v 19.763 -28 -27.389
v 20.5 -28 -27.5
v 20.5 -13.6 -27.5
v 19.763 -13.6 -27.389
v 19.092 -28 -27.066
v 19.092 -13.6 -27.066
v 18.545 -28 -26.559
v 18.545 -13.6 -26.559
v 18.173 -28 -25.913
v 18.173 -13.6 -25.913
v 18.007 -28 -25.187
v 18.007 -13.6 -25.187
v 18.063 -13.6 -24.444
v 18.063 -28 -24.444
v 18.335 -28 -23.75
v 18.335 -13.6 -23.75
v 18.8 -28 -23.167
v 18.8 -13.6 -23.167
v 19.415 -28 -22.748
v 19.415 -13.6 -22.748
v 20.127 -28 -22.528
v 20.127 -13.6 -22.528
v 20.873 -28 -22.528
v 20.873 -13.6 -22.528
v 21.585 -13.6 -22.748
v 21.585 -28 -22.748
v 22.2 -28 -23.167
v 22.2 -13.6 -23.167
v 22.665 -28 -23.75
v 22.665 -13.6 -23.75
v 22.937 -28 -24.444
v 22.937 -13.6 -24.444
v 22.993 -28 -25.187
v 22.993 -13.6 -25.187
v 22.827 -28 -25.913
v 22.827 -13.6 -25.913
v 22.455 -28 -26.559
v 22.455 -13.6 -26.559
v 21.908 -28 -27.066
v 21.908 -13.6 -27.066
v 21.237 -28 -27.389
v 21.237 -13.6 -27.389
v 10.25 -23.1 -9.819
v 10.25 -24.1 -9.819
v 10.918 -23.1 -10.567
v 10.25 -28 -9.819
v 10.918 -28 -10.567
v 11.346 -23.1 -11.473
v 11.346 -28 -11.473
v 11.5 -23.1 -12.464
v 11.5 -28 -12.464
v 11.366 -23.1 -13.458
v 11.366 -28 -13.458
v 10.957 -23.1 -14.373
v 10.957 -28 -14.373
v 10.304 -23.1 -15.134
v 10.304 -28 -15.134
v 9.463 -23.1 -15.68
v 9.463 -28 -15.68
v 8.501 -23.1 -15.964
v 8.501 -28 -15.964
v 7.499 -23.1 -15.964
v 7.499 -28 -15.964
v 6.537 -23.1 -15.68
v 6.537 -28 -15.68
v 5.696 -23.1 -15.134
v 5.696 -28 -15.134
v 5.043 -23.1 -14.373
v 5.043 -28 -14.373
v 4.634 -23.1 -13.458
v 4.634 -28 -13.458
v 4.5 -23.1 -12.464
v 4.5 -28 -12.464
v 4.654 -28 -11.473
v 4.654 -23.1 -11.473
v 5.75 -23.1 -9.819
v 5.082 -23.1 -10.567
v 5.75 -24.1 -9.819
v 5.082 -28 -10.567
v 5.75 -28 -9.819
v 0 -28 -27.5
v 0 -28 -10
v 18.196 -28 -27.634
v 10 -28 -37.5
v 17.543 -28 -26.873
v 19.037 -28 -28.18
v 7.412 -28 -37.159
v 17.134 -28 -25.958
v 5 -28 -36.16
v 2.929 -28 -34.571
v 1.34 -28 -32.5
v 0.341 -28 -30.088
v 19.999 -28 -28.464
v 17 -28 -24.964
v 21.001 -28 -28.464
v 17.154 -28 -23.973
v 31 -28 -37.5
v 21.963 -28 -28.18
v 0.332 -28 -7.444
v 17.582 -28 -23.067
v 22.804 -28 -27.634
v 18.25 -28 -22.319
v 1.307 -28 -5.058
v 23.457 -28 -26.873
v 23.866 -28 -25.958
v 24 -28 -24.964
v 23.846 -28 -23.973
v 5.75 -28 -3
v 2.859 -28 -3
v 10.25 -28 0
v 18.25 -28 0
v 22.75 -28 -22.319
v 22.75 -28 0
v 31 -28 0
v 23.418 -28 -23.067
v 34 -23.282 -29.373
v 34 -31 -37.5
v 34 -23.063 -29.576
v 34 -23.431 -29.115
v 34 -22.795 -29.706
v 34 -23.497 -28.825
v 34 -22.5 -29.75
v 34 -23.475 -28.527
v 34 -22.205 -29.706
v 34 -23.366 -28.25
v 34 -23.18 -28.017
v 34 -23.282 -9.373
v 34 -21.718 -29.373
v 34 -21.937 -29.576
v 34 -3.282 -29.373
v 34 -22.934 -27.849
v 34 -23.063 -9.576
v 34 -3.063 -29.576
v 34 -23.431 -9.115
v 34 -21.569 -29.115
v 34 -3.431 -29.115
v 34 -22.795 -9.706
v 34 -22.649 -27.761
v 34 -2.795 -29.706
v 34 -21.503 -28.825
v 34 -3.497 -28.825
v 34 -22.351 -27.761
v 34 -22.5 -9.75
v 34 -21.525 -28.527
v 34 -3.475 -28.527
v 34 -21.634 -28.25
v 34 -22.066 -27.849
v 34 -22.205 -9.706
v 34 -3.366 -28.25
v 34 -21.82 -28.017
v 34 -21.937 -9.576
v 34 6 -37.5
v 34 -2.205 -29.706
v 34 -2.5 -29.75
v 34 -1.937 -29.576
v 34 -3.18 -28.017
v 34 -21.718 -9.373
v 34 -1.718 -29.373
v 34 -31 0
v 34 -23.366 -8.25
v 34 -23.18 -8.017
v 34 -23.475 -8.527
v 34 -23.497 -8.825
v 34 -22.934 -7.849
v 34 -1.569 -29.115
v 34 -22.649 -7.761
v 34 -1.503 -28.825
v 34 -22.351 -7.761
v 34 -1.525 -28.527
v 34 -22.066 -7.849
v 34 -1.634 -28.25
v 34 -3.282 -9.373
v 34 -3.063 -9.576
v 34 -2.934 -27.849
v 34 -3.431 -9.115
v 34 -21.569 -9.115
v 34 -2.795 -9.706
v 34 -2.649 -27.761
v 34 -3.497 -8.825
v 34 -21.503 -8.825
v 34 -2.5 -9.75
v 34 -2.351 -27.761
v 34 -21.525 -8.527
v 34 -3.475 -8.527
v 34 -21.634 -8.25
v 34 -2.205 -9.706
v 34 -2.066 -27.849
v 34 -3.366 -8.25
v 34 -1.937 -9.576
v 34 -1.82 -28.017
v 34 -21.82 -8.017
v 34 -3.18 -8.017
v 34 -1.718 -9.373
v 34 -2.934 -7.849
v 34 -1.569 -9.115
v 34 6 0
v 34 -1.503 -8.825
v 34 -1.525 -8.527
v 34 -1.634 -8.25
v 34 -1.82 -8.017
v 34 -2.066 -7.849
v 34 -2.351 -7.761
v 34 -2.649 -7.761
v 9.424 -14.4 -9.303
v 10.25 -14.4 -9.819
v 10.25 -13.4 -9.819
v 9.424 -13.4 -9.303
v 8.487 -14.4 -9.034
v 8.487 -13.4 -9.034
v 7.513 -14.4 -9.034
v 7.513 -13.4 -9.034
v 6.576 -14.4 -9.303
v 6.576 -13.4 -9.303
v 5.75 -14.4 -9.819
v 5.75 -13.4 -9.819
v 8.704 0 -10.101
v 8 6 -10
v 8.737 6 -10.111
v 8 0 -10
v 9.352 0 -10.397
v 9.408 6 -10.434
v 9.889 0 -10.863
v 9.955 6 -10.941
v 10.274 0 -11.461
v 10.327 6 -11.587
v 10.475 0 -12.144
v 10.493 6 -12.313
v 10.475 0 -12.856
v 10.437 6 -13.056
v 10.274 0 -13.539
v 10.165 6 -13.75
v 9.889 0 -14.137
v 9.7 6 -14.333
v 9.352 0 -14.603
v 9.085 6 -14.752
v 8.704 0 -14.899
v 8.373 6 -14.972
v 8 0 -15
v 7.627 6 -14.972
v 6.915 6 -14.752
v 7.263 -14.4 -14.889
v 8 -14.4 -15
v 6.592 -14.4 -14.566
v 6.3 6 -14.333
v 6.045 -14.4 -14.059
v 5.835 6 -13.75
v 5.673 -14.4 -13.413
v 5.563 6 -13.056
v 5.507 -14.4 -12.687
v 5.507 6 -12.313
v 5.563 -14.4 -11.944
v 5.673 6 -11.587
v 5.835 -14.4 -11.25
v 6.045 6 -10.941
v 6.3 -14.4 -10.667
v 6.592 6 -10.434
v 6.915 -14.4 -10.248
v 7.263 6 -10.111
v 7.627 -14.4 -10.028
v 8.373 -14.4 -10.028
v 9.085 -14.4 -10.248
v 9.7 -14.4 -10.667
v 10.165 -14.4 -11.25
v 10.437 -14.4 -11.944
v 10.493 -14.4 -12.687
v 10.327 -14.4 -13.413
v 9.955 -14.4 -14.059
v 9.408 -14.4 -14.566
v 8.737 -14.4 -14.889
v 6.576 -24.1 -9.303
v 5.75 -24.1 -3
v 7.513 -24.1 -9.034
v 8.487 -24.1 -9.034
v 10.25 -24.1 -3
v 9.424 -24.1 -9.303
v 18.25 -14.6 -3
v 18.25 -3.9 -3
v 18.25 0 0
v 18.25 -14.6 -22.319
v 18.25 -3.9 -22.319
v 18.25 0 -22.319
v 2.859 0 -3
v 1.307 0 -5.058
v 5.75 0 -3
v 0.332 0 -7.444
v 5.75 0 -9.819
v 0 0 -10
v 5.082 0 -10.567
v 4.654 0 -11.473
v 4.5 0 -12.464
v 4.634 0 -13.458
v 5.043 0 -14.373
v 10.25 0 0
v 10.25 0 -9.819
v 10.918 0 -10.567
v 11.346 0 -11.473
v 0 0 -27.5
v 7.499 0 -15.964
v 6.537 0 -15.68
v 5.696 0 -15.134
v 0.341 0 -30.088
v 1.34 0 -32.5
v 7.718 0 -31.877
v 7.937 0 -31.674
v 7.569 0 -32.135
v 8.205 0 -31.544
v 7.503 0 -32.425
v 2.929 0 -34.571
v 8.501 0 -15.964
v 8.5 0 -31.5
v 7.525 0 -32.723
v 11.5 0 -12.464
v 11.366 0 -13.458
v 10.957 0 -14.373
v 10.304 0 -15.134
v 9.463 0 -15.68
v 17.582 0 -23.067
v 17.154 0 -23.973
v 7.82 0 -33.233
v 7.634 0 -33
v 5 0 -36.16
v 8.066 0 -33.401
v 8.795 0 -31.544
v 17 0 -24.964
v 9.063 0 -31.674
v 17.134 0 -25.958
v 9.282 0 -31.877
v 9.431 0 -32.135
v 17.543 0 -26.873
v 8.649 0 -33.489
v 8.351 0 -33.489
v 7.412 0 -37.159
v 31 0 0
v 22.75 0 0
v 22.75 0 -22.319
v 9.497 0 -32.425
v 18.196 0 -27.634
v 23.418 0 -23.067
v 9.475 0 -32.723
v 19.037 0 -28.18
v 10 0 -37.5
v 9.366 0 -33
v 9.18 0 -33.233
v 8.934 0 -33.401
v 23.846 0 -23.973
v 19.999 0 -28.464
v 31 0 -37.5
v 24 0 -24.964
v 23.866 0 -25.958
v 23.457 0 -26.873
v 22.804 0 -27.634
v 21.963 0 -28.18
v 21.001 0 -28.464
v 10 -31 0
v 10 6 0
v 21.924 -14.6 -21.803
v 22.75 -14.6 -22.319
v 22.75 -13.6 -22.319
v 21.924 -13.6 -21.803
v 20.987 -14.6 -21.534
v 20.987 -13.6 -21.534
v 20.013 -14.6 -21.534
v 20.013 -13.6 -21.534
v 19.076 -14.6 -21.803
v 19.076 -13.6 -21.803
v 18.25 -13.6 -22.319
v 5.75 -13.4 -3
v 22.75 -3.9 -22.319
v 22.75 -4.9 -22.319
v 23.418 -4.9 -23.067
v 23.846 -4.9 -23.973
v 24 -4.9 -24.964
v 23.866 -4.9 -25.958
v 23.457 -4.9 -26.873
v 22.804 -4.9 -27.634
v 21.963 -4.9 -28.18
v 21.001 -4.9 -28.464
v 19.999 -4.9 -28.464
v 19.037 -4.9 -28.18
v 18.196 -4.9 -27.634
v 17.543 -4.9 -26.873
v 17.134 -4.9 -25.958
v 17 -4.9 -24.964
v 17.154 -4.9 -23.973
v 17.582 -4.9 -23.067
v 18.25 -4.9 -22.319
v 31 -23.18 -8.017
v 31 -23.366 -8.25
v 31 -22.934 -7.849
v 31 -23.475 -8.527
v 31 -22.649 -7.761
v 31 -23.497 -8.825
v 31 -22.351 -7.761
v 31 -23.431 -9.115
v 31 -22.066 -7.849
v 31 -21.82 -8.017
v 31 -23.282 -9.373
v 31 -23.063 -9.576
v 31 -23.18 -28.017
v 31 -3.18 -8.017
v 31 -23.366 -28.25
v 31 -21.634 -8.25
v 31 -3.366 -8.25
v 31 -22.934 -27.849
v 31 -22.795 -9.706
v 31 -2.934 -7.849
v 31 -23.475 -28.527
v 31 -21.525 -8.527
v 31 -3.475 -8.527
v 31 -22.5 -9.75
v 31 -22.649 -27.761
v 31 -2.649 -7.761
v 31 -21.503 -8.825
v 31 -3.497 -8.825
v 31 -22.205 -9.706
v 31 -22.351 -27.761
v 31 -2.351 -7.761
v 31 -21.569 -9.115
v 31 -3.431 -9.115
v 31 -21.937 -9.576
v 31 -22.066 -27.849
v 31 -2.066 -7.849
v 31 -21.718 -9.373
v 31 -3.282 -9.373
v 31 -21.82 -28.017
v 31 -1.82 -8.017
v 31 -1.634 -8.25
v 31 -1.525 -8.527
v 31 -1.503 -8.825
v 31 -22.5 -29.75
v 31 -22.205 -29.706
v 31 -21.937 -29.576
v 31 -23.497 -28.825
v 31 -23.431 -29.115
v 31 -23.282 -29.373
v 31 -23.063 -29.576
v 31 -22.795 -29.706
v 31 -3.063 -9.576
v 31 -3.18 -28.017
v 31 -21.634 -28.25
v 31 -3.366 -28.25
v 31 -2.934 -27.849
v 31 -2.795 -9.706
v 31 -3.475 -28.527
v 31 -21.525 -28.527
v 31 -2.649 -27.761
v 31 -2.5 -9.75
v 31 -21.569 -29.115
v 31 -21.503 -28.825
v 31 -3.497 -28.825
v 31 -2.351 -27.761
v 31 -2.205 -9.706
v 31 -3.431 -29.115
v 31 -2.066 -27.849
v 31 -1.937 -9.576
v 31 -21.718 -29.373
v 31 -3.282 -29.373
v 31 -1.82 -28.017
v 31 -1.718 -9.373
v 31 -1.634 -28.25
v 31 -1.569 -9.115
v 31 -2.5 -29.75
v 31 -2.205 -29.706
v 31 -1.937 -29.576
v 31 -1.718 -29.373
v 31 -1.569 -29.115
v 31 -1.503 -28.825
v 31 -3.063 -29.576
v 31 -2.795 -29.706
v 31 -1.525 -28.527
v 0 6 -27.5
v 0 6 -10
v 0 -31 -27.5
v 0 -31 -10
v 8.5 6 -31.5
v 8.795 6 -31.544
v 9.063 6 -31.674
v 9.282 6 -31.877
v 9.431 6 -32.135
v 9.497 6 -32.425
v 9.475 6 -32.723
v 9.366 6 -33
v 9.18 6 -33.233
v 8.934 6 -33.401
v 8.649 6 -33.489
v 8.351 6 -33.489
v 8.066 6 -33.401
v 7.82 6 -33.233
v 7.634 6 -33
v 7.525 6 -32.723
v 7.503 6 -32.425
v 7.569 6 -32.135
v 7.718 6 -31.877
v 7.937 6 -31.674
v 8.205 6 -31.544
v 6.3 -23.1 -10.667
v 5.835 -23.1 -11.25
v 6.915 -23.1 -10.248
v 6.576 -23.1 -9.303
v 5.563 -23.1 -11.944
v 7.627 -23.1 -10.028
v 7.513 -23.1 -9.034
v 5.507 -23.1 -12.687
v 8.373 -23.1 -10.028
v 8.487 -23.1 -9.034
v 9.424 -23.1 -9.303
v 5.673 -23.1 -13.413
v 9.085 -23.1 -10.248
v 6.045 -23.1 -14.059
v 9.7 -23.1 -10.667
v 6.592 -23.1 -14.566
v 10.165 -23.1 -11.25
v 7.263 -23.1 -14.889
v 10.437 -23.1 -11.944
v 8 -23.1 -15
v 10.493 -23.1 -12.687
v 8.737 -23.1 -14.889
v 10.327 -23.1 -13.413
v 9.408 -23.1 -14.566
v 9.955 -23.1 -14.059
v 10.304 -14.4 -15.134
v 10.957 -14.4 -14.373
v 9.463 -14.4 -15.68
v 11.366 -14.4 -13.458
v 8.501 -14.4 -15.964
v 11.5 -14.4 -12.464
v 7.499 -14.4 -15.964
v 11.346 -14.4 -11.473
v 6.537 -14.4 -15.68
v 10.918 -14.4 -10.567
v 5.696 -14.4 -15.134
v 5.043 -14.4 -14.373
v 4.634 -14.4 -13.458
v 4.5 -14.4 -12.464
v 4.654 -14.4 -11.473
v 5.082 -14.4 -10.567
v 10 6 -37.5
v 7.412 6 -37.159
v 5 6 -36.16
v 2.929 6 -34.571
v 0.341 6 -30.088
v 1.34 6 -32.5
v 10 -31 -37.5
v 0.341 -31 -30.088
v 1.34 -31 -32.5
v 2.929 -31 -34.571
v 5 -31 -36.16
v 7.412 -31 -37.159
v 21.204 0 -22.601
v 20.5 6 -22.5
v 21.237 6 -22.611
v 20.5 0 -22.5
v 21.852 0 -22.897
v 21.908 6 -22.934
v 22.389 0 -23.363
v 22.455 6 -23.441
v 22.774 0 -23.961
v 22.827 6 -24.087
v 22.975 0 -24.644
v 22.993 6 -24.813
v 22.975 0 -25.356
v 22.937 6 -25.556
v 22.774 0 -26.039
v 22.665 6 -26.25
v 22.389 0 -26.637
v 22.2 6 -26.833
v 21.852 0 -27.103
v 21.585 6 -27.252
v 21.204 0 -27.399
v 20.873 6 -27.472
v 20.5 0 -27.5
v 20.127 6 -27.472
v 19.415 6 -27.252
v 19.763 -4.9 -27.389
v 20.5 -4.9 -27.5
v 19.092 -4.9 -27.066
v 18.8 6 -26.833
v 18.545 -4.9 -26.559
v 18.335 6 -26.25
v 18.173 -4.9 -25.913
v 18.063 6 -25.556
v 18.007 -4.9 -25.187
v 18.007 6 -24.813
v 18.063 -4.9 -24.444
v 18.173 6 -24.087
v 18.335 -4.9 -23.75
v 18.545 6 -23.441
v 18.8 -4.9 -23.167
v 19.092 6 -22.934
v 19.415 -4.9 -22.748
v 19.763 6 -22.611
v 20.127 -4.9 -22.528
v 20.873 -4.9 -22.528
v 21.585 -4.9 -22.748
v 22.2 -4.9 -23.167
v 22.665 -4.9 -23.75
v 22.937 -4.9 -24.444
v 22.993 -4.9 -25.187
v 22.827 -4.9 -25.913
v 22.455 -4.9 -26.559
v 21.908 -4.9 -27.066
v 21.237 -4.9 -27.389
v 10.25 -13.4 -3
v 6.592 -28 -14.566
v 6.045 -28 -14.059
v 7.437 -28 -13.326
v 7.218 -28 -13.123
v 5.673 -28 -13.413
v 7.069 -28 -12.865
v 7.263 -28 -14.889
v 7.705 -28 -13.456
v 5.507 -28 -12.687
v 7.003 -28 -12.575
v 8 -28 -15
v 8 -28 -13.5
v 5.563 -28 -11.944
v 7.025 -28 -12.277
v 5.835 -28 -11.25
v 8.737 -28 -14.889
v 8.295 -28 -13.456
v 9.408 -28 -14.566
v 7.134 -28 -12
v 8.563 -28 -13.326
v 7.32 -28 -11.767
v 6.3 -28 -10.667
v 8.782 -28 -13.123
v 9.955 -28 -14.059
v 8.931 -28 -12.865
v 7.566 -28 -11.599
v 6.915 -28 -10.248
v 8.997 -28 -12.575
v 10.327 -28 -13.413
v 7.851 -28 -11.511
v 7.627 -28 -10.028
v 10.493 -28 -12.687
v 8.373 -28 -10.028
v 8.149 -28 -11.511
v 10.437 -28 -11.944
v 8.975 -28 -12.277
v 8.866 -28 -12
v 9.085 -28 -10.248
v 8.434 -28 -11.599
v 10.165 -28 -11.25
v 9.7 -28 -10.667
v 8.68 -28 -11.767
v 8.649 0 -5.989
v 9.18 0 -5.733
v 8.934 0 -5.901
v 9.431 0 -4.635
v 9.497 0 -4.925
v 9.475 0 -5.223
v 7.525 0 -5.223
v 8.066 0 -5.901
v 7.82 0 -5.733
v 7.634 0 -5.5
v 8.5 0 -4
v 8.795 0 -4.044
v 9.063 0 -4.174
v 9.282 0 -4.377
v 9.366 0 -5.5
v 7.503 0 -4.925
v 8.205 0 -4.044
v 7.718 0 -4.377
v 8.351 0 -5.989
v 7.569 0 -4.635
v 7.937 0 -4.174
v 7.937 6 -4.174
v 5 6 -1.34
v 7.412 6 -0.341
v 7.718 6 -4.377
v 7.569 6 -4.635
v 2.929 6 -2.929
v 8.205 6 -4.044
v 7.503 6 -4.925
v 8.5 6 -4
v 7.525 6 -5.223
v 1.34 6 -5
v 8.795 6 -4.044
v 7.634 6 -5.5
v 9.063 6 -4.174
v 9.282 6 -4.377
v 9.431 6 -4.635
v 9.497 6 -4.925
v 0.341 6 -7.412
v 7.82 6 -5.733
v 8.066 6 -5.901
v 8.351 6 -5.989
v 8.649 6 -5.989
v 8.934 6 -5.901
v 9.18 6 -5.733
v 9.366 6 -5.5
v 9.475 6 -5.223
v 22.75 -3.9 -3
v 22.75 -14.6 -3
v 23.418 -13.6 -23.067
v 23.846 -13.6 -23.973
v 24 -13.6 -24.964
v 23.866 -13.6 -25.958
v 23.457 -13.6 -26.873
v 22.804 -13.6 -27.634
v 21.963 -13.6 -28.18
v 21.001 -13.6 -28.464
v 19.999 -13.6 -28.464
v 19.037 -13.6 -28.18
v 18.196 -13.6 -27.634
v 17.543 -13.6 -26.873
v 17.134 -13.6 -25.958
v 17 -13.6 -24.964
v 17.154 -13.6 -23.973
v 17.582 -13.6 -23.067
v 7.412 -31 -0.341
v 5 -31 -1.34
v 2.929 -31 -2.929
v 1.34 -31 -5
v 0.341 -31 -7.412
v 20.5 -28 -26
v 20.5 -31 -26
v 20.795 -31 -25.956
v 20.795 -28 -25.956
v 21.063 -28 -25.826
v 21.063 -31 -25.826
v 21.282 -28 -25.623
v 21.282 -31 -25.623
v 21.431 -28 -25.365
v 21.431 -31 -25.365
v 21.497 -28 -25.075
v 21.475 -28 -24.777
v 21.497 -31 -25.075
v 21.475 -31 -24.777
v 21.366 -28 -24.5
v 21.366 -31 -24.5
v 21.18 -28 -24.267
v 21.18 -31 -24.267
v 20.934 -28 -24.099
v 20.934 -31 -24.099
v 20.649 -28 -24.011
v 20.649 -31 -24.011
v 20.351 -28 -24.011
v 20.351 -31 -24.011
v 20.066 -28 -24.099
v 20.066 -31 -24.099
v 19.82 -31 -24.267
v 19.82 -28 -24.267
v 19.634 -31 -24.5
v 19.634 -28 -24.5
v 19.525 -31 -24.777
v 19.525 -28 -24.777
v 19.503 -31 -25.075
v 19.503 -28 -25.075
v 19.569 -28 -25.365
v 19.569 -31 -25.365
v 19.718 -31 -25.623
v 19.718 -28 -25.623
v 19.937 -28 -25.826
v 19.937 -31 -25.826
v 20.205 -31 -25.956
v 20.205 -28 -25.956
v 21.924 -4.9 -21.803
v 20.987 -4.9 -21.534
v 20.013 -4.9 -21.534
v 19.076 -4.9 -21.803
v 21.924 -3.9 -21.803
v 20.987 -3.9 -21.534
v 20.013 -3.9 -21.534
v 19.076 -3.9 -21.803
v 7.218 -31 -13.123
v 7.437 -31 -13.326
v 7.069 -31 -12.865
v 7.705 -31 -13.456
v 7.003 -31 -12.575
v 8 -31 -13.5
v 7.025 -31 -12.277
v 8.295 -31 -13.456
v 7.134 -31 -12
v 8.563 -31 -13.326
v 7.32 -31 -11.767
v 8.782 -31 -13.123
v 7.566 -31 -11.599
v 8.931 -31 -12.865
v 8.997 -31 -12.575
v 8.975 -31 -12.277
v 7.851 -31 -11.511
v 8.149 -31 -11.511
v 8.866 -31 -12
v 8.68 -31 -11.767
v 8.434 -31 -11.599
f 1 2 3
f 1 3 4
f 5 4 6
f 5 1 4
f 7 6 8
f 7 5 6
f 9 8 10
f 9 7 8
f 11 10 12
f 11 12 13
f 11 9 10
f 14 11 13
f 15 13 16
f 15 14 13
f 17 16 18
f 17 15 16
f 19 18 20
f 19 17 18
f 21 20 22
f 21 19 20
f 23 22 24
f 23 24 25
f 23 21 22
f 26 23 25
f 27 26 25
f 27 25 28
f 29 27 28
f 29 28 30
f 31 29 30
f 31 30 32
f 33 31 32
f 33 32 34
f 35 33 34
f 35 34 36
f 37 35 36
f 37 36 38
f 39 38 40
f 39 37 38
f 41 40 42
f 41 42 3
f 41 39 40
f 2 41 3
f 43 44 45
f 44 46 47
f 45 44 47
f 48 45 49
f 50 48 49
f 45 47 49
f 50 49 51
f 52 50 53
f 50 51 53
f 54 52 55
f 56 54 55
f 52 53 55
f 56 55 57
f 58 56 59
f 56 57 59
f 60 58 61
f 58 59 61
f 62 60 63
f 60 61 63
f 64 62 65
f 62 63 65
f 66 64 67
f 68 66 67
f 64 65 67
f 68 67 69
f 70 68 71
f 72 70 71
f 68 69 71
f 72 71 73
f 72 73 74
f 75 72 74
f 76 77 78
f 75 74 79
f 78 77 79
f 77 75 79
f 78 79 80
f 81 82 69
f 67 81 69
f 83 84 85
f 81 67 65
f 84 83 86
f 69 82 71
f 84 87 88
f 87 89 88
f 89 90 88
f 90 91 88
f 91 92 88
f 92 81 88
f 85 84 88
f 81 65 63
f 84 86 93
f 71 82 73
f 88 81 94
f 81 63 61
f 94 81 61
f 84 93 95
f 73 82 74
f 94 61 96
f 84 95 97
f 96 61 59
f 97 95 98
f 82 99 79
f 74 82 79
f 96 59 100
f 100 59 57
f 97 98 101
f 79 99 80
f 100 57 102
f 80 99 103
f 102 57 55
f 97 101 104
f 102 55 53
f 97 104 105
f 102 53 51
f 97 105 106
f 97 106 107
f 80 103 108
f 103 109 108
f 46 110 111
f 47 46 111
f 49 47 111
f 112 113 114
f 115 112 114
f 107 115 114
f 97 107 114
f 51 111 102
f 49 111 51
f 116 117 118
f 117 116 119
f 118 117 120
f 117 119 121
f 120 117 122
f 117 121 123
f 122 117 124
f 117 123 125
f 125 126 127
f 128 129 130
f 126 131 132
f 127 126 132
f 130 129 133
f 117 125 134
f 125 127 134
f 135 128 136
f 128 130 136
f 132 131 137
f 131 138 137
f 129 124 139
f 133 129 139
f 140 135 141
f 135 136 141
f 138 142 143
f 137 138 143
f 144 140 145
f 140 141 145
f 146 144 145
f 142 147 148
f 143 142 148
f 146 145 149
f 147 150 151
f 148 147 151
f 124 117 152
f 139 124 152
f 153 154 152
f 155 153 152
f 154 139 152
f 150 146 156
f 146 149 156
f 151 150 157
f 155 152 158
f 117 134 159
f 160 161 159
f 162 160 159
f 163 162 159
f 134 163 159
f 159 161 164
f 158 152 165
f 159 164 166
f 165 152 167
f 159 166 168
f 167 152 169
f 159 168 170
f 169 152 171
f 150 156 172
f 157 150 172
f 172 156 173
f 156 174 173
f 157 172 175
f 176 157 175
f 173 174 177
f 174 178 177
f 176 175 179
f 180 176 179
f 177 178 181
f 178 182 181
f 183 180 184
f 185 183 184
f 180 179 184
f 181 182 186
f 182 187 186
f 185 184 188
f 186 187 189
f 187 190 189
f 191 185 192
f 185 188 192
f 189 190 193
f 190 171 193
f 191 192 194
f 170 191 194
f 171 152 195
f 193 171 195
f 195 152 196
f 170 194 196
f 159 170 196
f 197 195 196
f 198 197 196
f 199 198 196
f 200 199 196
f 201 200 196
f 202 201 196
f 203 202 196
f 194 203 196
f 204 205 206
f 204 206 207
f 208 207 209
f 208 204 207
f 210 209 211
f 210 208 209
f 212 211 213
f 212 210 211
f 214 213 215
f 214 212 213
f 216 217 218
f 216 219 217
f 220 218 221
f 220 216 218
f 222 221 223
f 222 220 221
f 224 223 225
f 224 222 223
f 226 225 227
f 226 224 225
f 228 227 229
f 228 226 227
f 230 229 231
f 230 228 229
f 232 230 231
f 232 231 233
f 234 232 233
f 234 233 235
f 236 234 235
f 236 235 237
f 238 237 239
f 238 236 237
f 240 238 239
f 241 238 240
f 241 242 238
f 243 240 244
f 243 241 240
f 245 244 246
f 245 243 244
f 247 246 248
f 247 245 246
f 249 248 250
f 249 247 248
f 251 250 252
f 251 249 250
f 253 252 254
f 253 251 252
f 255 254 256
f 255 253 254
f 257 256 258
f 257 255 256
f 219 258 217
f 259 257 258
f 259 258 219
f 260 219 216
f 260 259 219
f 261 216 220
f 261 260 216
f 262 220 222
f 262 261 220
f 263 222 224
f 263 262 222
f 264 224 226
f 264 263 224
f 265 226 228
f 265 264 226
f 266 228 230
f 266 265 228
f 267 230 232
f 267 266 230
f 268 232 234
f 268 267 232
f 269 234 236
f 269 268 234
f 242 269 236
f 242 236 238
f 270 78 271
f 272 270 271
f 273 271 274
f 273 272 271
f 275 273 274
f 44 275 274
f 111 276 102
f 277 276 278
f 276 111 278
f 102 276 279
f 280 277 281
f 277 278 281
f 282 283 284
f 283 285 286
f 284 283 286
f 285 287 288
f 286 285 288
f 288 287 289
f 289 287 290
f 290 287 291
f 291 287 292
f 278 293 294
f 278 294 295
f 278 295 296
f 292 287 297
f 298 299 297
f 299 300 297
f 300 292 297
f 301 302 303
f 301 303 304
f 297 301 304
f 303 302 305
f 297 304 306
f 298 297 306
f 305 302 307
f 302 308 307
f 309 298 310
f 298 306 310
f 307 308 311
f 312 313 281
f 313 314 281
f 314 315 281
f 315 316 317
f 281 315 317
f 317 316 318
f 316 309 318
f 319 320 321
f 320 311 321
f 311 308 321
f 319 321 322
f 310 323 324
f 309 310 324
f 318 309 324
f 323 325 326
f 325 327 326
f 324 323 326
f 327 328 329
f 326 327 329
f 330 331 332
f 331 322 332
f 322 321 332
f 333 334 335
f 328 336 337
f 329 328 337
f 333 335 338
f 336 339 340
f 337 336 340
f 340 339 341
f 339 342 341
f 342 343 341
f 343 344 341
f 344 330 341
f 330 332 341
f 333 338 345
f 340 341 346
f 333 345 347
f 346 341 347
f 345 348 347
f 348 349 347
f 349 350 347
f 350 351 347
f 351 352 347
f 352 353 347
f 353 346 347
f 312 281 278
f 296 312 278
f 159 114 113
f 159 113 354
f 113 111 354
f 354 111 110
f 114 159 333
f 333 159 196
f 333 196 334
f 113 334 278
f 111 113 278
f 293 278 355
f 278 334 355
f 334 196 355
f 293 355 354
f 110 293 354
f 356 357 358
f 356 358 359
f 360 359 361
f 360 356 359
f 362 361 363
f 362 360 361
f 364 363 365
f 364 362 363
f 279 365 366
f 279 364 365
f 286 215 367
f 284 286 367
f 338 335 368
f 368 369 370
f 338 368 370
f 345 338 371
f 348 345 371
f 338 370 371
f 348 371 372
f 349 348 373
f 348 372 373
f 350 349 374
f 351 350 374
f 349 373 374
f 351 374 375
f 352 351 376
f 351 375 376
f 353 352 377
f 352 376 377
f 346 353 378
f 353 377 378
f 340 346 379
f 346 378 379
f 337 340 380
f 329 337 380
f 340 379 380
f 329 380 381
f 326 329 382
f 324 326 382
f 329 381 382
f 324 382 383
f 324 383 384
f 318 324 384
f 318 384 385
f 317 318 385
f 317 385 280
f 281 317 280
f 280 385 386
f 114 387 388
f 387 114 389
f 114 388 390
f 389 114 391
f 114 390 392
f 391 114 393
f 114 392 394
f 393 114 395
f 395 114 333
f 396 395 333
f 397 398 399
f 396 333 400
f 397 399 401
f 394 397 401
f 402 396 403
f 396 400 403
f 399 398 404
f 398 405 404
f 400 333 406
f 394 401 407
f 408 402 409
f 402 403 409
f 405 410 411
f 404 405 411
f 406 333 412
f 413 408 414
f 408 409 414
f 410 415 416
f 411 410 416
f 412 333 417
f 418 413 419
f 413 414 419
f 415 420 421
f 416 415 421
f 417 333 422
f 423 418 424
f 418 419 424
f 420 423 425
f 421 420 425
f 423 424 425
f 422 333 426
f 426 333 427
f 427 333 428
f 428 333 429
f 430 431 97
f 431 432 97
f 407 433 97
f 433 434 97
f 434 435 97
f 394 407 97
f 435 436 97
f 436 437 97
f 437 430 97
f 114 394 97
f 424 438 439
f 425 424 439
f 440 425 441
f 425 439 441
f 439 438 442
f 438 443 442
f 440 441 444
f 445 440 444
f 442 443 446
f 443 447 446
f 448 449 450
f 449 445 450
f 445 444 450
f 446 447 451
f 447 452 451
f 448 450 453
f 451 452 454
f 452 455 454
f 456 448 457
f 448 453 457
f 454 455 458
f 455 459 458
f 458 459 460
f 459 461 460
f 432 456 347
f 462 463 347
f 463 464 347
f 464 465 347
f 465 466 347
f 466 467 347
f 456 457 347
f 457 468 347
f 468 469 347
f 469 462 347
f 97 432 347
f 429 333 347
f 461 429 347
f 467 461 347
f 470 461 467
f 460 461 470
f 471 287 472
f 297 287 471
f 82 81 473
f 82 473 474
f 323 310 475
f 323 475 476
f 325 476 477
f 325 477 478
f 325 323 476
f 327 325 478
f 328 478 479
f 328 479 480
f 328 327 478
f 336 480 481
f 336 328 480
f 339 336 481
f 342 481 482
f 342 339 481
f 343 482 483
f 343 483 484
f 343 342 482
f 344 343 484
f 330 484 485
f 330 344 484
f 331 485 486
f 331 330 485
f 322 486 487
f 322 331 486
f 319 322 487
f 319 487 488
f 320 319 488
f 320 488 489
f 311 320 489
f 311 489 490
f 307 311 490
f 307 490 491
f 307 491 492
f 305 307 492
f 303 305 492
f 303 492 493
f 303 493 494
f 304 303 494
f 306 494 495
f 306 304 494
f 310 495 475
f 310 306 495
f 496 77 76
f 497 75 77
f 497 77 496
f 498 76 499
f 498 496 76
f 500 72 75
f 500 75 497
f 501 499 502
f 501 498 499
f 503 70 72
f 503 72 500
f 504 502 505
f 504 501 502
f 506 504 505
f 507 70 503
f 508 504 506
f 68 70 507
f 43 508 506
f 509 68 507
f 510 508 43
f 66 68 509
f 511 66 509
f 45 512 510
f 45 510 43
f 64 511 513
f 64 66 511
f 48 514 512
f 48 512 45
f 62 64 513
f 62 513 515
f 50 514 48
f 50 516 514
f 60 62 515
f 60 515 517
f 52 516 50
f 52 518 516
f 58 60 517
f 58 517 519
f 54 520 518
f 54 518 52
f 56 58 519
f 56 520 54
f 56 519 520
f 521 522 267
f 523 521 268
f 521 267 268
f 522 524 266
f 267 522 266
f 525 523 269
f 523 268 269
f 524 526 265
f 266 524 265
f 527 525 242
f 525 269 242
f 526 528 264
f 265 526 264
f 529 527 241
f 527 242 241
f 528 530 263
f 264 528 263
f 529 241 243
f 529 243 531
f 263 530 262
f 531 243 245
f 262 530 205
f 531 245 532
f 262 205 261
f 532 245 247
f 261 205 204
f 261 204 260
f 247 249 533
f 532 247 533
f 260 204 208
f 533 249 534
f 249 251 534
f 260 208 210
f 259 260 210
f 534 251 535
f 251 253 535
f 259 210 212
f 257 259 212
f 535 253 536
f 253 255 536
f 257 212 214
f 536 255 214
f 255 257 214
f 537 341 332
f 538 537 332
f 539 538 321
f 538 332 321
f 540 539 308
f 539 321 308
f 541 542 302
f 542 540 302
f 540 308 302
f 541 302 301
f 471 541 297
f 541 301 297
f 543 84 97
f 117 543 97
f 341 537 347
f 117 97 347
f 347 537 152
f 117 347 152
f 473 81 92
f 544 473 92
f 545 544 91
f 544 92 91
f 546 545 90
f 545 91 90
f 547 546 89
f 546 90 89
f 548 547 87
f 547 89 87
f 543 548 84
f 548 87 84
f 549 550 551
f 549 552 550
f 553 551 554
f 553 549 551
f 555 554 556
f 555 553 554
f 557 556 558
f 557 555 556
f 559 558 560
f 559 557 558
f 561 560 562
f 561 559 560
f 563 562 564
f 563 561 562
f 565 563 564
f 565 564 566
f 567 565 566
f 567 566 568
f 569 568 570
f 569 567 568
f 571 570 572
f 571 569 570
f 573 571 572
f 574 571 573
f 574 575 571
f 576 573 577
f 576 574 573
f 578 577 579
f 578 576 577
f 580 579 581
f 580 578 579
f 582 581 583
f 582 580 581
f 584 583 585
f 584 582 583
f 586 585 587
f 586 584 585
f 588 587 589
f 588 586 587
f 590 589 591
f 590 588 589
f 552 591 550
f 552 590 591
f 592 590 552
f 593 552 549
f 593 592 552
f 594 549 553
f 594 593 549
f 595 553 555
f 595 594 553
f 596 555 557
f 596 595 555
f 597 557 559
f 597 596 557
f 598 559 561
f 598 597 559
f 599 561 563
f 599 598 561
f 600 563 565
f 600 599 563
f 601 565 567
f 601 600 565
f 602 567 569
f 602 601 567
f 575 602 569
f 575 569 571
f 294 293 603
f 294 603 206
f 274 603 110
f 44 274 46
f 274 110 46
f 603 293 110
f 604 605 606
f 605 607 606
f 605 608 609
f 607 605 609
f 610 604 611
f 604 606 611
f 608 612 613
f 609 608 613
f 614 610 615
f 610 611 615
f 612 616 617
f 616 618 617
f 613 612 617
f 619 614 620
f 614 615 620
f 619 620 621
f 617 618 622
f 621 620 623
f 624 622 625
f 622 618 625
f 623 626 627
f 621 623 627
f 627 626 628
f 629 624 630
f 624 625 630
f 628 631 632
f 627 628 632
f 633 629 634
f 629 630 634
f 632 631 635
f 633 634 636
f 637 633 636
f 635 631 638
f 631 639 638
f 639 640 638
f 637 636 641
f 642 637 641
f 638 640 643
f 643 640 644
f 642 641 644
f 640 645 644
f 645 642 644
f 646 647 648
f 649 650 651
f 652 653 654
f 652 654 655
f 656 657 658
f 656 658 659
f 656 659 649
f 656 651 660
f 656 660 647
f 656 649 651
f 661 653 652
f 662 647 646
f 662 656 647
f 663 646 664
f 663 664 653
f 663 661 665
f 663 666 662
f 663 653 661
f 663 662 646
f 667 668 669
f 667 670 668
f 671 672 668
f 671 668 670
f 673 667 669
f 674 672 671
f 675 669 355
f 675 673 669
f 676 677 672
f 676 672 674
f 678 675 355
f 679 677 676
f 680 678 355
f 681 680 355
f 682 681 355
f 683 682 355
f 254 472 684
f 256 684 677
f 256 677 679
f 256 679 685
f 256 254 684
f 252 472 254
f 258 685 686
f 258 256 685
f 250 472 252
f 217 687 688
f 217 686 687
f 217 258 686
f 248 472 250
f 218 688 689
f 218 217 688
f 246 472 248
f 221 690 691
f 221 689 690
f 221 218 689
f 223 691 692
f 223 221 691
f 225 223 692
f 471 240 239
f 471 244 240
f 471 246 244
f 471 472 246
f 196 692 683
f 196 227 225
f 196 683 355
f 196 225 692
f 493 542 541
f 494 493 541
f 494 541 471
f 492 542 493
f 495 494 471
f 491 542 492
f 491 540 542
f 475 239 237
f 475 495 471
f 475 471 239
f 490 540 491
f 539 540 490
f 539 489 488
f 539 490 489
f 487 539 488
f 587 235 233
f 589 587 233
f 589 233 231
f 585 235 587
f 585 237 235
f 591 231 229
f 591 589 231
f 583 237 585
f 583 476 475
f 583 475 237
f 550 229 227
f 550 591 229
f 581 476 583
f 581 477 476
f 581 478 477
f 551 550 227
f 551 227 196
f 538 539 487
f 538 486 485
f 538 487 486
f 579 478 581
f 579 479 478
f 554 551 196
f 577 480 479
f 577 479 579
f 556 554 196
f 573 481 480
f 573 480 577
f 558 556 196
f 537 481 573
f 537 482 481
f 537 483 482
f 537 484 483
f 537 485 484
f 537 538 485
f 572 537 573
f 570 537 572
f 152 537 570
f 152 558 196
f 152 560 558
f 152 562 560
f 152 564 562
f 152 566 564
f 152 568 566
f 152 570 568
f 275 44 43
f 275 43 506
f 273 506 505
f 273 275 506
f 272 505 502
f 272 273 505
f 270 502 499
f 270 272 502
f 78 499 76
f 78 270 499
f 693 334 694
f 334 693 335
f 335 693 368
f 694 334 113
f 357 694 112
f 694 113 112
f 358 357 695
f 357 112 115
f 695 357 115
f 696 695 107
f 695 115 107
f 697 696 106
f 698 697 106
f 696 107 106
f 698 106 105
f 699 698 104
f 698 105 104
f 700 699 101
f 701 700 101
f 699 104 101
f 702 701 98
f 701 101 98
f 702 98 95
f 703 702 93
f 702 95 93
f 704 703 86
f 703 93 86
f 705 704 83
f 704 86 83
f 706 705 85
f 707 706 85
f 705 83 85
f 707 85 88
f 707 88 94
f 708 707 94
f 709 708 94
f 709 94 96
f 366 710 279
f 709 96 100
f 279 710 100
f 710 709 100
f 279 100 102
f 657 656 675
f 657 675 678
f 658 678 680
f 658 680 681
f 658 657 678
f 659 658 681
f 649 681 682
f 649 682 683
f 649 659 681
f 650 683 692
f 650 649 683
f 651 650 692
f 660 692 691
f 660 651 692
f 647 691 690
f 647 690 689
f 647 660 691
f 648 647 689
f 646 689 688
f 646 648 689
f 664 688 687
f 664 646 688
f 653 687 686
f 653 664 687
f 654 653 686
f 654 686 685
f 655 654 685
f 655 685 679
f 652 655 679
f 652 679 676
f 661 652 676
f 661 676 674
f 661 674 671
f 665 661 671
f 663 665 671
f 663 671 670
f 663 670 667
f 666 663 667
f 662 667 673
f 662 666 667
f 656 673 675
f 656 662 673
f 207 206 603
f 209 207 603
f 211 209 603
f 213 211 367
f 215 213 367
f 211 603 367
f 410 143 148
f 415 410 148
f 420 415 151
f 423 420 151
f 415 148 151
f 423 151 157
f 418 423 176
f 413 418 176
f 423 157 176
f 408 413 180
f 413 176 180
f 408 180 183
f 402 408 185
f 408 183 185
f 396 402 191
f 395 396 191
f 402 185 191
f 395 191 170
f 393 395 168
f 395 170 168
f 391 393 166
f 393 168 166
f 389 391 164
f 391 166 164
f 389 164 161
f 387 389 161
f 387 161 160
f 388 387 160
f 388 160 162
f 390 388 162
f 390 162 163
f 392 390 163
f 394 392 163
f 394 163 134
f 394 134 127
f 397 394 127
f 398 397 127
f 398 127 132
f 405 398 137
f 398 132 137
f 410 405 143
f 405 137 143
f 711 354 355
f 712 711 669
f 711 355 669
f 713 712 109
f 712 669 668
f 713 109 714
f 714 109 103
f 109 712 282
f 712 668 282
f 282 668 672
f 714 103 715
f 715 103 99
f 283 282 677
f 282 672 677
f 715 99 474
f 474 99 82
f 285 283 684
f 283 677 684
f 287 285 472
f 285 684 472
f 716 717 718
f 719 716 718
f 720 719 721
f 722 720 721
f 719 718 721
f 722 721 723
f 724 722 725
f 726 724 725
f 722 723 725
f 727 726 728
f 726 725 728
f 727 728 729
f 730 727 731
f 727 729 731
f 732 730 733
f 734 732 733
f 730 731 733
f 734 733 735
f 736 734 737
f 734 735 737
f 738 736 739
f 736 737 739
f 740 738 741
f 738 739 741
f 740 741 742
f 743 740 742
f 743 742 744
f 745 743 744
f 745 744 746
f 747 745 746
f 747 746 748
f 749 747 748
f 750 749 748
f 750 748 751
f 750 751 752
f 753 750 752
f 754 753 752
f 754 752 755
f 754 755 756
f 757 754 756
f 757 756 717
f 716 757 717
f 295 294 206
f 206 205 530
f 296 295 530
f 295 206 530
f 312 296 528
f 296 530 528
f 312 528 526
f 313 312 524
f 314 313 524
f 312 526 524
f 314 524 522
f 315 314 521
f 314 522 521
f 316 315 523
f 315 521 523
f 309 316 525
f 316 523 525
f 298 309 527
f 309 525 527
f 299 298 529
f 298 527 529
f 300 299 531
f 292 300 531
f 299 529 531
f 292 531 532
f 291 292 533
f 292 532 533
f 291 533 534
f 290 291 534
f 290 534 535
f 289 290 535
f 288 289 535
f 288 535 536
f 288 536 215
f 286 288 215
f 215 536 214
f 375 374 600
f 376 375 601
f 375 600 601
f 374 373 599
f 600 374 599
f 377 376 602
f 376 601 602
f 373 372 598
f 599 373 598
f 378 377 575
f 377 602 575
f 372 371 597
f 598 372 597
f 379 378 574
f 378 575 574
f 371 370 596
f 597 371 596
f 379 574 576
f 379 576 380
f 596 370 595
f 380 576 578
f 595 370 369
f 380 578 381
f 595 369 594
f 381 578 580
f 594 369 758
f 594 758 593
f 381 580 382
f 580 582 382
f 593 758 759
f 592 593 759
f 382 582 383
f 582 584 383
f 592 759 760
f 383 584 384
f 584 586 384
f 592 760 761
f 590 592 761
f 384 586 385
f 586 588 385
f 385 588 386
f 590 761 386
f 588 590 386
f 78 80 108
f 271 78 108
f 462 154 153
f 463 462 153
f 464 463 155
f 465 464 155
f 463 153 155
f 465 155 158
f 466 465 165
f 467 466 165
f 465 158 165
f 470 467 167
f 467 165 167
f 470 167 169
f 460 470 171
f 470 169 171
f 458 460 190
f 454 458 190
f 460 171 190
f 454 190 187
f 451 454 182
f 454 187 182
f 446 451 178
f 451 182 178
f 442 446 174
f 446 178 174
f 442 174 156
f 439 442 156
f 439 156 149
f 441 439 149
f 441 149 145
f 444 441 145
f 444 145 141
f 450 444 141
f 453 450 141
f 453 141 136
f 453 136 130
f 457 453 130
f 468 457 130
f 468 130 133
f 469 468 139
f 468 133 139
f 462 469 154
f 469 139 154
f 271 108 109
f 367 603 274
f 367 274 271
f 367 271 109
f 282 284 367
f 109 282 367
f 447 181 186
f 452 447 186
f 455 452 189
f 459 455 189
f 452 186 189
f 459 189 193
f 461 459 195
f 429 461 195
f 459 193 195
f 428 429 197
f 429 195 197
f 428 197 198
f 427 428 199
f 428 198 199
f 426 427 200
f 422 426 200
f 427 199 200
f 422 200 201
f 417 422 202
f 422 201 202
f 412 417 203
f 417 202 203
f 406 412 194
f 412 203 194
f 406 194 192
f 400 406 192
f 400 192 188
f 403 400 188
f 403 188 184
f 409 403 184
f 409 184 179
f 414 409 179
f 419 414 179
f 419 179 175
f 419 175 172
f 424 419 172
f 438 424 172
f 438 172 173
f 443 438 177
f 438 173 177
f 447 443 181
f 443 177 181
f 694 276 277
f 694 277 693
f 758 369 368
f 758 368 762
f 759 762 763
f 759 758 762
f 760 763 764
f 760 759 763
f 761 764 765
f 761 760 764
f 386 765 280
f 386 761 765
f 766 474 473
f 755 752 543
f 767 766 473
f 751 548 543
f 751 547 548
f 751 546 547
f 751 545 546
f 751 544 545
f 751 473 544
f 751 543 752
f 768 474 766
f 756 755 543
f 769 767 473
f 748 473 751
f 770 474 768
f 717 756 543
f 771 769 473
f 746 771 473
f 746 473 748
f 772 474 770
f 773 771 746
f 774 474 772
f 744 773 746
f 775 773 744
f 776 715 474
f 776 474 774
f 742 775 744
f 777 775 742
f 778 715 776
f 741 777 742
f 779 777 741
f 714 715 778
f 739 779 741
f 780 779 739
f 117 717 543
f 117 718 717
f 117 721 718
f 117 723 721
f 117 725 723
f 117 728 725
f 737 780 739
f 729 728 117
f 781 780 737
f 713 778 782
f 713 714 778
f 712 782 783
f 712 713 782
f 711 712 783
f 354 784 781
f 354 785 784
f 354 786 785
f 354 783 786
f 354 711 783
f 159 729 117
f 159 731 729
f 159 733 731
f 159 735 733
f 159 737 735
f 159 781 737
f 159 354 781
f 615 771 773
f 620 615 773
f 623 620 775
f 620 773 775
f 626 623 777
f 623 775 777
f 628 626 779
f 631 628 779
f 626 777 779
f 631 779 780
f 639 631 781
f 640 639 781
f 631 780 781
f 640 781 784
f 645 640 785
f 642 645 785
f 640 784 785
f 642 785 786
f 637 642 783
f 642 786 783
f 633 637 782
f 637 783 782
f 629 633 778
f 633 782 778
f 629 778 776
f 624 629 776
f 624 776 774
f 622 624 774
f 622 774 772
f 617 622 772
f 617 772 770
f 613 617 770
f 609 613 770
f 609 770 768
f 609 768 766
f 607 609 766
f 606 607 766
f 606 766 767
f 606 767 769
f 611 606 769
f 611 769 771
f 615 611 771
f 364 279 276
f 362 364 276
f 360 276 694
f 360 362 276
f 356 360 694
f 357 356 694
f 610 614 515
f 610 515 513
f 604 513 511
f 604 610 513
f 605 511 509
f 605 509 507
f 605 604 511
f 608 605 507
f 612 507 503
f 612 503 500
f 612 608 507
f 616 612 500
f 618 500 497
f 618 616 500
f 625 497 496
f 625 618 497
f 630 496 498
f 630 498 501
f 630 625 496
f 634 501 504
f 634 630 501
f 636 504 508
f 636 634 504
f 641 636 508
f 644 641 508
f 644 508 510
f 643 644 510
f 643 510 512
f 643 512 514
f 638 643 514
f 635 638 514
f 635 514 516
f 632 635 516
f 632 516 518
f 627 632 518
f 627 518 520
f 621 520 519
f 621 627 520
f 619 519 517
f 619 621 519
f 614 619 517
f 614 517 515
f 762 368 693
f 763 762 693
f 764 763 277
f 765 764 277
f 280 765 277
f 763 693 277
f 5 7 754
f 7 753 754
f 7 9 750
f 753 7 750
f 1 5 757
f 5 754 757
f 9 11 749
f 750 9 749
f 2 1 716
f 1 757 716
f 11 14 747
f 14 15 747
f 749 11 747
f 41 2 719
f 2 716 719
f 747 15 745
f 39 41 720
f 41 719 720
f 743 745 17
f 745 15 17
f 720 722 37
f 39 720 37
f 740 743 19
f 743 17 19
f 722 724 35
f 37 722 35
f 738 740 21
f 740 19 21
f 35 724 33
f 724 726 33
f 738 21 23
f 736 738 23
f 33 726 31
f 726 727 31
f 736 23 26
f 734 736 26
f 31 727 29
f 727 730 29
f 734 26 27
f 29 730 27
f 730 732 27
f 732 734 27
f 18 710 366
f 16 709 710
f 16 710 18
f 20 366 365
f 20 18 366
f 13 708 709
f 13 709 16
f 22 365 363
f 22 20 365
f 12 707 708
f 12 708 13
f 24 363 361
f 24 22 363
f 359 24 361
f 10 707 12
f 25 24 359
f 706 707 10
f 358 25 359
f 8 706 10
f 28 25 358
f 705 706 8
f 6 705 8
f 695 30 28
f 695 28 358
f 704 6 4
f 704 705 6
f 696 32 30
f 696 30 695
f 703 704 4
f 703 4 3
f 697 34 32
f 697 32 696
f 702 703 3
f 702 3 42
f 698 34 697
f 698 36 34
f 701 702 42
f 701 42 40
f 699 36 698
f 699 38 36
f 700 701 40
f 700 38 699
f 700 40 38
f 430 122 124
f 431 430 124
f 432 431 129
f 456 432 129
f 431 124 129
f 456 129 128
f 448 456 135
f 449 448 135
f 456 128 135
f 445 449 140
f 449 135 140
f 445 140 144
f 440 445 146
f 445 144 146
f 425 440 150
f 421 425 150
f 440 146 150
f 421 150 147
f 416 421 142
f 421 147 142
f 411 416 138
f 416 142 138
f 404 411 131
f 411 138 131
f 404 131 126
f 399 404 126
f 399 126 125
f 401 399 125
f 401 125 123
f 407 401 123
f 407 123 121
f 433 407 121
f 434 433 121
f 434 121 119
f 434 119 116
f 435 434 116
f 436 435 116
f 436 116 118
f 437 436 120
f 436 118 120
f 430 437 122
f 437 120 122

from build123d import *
from build123d.topology import SkipClean

# Parameters (mm, degrees)
TOP_SKETCH1_W                             = 34
TOP_SKETCH1_H                             = 37.5
TOP_SKETCH1_R                             = 1
TOP_SKETCH1_R_2                           = 2.5
BOSS_EXTRUDE4_DEPTH                       = 6
TOPRIGHTRISERBOSS_EXTRUDE5_START          = 14.4
TOPRIGHTRISER_R                           = 2.5
TOPRIGHTRISERBOSS_EXTRUDE5_DEPTH          = 14.4
TOPLEFTBOSS_EXTRUDE6_START                = 4.9
TOPLEFT_R                                 = 2.5
TOPLEFTBOSS_EXTRUDE6_DEPTH                = 4.9
MIDWALL_W                                 = 10.25
MIDWALL_H                                 = 3
MIDWALL_W_2                               = 4.5
MIDWALL_W_3                               = 3
MIDWALL_H_2                               = 37.5
MIDWALLBOSS_EXTRUDE7_DEPTH                = 28
BOTTOM_W                                  = 34
BOTTOM_H                                  = 37.5
BOTTOMBOSS_EXTRUDE8_DEPTH                 = 3
LOWERRIGHT_R                              = 2.5
LOWERRIGHTBOSS_EXTRUDE10_DEPTH            = 4.9
LOWERLEFT_R                               = 2.5
LOWERLEFTBOSS_EXTRUDE9_DEPTH              = 14.4
FILLET1_R                                 = 10
LINEARRAILMOUNTINGHOLES_SKETCH10_R        = 1
LINEARRAILMOUNTINGHOLESCUT_EXTRUDE1_DEPTH = 3
TOPRIGHTINSET_CUT_EXTRUDE1_DEPTH          = 1
TOPLEFTINSET_CUT_EXTRUDE2_DEPTH           = 1
LOWERLEFTINSET_CUT_EXTRUDE3_START         = -1
LOWERLEFTINSET_CUT_EXTRUDE3_DEPTH         = 1
LOWERRIGHTINSETCUT_EXTRUDE4_START         = -1
LOWERRIGHTINSETCUT_EXTRUDE4_DEPTH         = 1
PUSHPINHOLESKETCH1_R                      = 1
PUSHPINHOLECUT_EXTRUDE5_DEPTH             = 63.69968102


with BuildPart() as part:
    # Top-Sketch1 → Boss-Extrude4 (new body)
    with BuildSketch(Plane(origin=(0, 0, 0), x_dir=(1, 0, 0), z_dir=(0, 1, 0))):
        with Locations((17, 18.75)):
            Rectangle(TOP_SKETCH1_W, TOP_SKETCH1_H)
        with Locations(Location((8.5, 32.5, 0), (0, 0, 270))):
            Circle(TOP_SKETCH1_R, mode=Mode.SUBTRACT)
        with Locations(Location((8.5, 5, 0), (0, 0, 270))):
            Circle(TOP_SKETCH1_R, mode=Mode.SUBTRACT)
        with Locations(Location((8, 12.5, 0), (0, 0, 270))):
            Circle(TOP_SKETCH1_R_2, mode=Mode.SUBTRACT)
        with Locations(Location((20.5, 25, 0), (0, 0, 270))):
            Circle(TOP_SKETCH1_R_2, mode=Mode.SUBTRACT)
    extrude(amount=BOSS_EXTRUDE4_DEPTH)

    # TopRightRiser → TopRightRiserBoss-Extrude5 (add)
    with SkipClean():  # the faces are left unmerged after this step: merging them gives an invalid solid
        with BuildSketch(Plane.XZ.offset(TOPRIGHTRISERBOSS_EXTRUDE5_START)):
            with BuildLine():
                Line((5.75, -9.819048676), (5.75, 0))
                Line((5.75, 0), (10.25, 0))
                Line((10.25, 0), (10.25, -9.819048676))
                ThreePointArc((10.25, -9.819048676), (8, -16), (5.75, -9.819048676))
            make_face()
            with Locations(Location((8, -12.5, 0), (0, 0, 270))):
                Circle(TOPRIGHTRISER_R, mode=Mode.SUBTRACT)
        extrude(amount=-TOPRIGHTRISERBOSS_EXTRUDE5_DEPTH)

    # TopLeft → TopLeftBoss-Extrude6 (add)
    with SkipClean():  # the faces are left unmerged after this step: merging them gives an invalid solid
        with BuildSketch(Plane.XZ.offset(TOPLEFTBOSS_EXTRUDE6_START)):
            with BuildLine():
                Line((18.25, -22.319048676), (18.25, 0))
                Line((18.25, 0), (22.75, 0))
                Line((22.75, 0), (22.75, -22.319048676))
                ThreePointArc((22.75, -22.319048676), (20.5, -28.5), (18.25, -22.319048676))
            make_face()
            with Locations(Location((20.5, -25, 0), (0, 0, 270))):
                Circle(TOPLEFT_R, mode=Mode.SUBTRACT)
        extrude(amount=-TOPLEFTBOSS_EXTRUDE6_DEPTH)

    # MidWall → MidWallBoss-Extrude7 (add)
    with SkipClean():  # the faces are left unmerged after this step: merging them gives an invalid solid
        with BuildSketch(Plane(origin=(0, 0, 0), x_dir=(-1, 0, 0), z_dir=(0, -1, 0))):
            with Locations((-5.125, 1.5)):
                Rectangle(MIDWALL_W, MIDWALL_H)
            with Locations((-20.5, 1.5)):
                Rectangle(MIDWALL_W_2, MIDWALL_H)
            with Locations((-32.5, 18.75)):
                Rectangle(MIDWALL_W_3, MIDWALL_H_2)
        extrude(amount=MIDWALLBOSS_EXTRUDE7_DEPTH)

    # Bottom → BottomBoss-Extrude8 (add)
    with SkipClean():  # the faces are left unmerged after this step: merging them gives an invalid solid
        with BuildSketch(Plane.XZ.offset(28)):
            with Locations((17, -18.75)):
                Rectangle(BOTTOM_W, BOTTOM_H)
        extrude(amount=BOTTOMBOSS_EXTRUDE8_DEPTH)

    # LowerRight → LowerRightBoss-Extrude10 (add)
    with SkipClean():  # the faces are left unmerged after this step: merging them gives an invalid solid
        with BuildSketch(Plane(origin=(0, -28, 0), x_dir=(1, 0, 0), z_dir=(0, 1, 0))):
            with BuildLine():
                Line((5.75, 9.819048676), (5.75, 3))
                Line((5.75, 3), (10.25, 3))
                Line((10.25, 3), (10.25, 9.819048676))
                ThreePointArc((10.25, 9.819048676), (8, 16), (5.75, 9.819048676))
            make_face()
            with Locations(Location((8, 12.5, 0), (0, 0, 90))):
                Circle(LOWERRIGHT_R, mode=Mode.SUBTRACT)
        extrude(amount=LOWERRIGHTBOSS_EXTRUDE10_DEPTH)

    # LowerLeft → LowerLeftBoss-Extrude9 (add)
    with SkipClean():  # the faces are left unmerged after this step: merging them gives an invalid solid
        with BuildSketch(Plane(origin=(0, -28, 0), x_dir=(1, 0, 0), z_dir=(0, 1, 0))):
            with BuildLine():
                Line((18.25, 0), (22.75, 0))
                Line((22.75, 0), (22.75, 22.319048676))
                ThreePointArc((22.75, 22.319048676), (20.5, 28.5), (18.25, 22.319048676))
                Line((18.25, 22.319048676), (18.25, 0))
            make_face()
            with Locations(Location((20.5, 25, 0), (0, 0, 90))):
                Circle(LOWERLEFT_R, mode=Mode.SUBTRACT)
        extrude(amount=LOWERLEFTBOSS_EXTRUDE9_DEPTH)

    # Fillet1
    # the kernel refuses this fillet: 10 mm, written as the material it takes off along each edge
    with BuildSketch(Plane(origin=(0, 0, 0), x_dir=(1, 0, 0), z_dir=(0, -1, 0)), Plane(origin=(0, -28, 0), x_dir=(1, 0, 0), z_dir=(0, -1, 0))) as fillet1_piece_1:
        with BuildLine():
            CenterArc((FILLET1_R, -FILLET1_R), FILLET1_R, 90, 90)
            Line((0, -FILLET1_R), (0, 0))
            Line((0, 0), (FILLET1_R, 0))
        make_face()
    extrude(amount=28, mode=Mode.SUBTRACT)
    with BuildSketch(Plane(origin=(0, -3, -37.5), x_dir=(0, 0, 1), z_dir=(0, -1, 0))) as fillet1_piece_2:
        with BuildLine():
            CenterArc((FILLET1_R, -FILLET1_R), FILLET1_R, 90, 90)
            Line((0, -FILLET1_R), (0, 0))
            Line((0, 0), (FILLET1_R, 0))
        make_face()
    extrude(amount=53, mode=Mode.SUBTRACT)
    with BuildSketch(Plane(origin=(0, -25, -37.5), x_dir=(0, 0, 1), z_dir=(0, 1, 0))) as fillet1_piece_3:
        with BuildLine():
            CenterArc((FILLET1_R, FILLET1_R), FILLET1_R, 180, 90)
            Line((0, FILLET1_R), (0, 0))
            Line((0, 0), (FILLET1_R, 0))
        make_face()
    extrude(amount=56, mode=Mode.SUBTRACT)
    with BuildSketch(Plane(origin=(0, 0, 0), x_dir=(1, 0, 0), z_dir=(0, 1, 0))) as fillet1_piece_4:
        with BuildLine():
            CenterArc((FILLET1_R, FILLET1_R), FILLET1_R, 180, 90)
            Line((0, FILLET1_R), (0, 0))
            Line((0, 0), (FILLET1_R, 0))
        make_face()
    extrude(amount=31, mode=Mode.SUBTRACT)

    # LinearRailMountingHoles-Sketch10 → LinearRailMountingHolesCut-Extrude1 (cut)
    with BuildSketch(Plane(origin=(34, 0, 0), x_dir=(0, 0, -1), z_dir=(1, 0, 0))):
        with Locations((8.75, -2.5)):
            Circle(LINEARRAILMOUNTINGHOLES_SKETCH10_R)
        with Locations((8.75, -22.5)):
            Circle(LINEARRAILMOUNTINGHOLES_SKETCH10_R)
        with Locations((28.75, -22.5)):
            Circle(LINEARRAILMOUNTINGHOLES_SKETCH10_R)
        with Locations((28.75, -2.5)):
            Circle(LINEARRAILMOUNTINGHOLES_SKETCH10_R)
    extrude(amount=-LINEARRAILMOUNTINGHOLESCUT_EXTRUDE1_DEPTH, mode=Mode.SUBTRACT)

    # TopRightInset-Sketch1 → TopRightInset-Cut-Extrude1 (cut)
    with BuildSketch(Plane.XZ.offset(14.4)):
        with BuildLine():
            Line((5.75, -9.819048676), (5.75, -3))
            Line((5.75, -3), (10.25, -3))
            Line((10.25, -3), (10.25, -9.819048676))
            ThreePointArc((10.25, -9.819048676), (8, -9), (5.75, -9.819048676))
        make_face()
    extrude(amount=-TOPRIGHTINSET_CUT_EXTRUDE1_DEPTH, mode=Mode.SUBTRACT)

    # TopLeftInset-Sketch2 → TopLeftInset-Cut-Extrude2 (cut)
    with BuildSketch(Plane.XZ.offset(4.9)):
        with BuildLine():
            Line((18.25, -22.319048676), (18.25, -3))
            Line((18.25, -3), (22.75, -3))
            Line((22.75, -3), (22.75, -22.319048676))
            ThreePointArc((22.75, -22.319048676), (20.5, -21.5), (18.25, -22.319048676))
        make_face()
    extrude(amount=-TOPLEFTINSET_CUT_EXTRUDE2_DEPTH, mode=Mode.SUBTRACT)

    # LowerLeftInset-Sketch3 → LowerLeftInset-Cut-Extrude3 (cut)
    with BuildSketch(Plane(origin=(0, -13.6, 0), x_dir=(1, 0, 0), z_dir=(0, 1, 0)).offset(LOWERLEFTINSET_CUT_EXTRUDE3_START)):
        with BuildLine():
            Line((18.25, 22.319048676), (18.25, 3))
            Line((18.25, 3), (22.75, 3))
            Line((22.75, 3), (22.75, 22.319048676))
            ThreePointArc((22.75, 22.319048676), (20.5, 21.5), (18.25, 22.319048676))
        make_face()
    extrude(amount=LOWERLEFTINSET_CUT_EXTRUDE3_DEPTH, mode=Mode.SUBTRACT)

    # LowerRightInset-Sketch4 → LowerRightInsetCut-Extrude4 (cut)
    with BuildSketch(Plane(origin=(0, -23.1, 0), x_dir=(1, 0, 0), z_dir=(0, 1, 0)).offset(LOWERRIGHTINSETCUT_EXTRUDE4_START)):
        with BuildLine():
            Line((5.75, 9.819048676), (5.75, 3))
            Line((5.75, 3), (10.25, 3))
            Line((10.25, 3), (10.25, 9.819048676))
            ThreePointArc((10.25, 9.819048676), (8, 9), (5.75, 9.819048676))
        make_face()
    extrude(amount=LOWERRIGHTINSETCUT_EXTRUDE4_DEPTH, mode=Mode.SUBTRACT)

    # PushPinHoleSketch1 → PushPinHoleCut-Extrude5 (cut, through all)
    with BuildSketch(Plane.XZ.offset(31)):
        with Locations(Location((20.5, -25, 0), (0, 0, 270))):
            Circle(PUSHPINHOLESKETCH1_R)
        with Locations(Location((8, -12.5, 0), (0, 0, 270))):
            Circle(PUSHPINHOLESKETCH1_R)
    extrude(amount=-PUSHPINHOLECUT_EXTRUDE5_DEPTH, mode=Mode.SUBTRACT)


solid = part.part
